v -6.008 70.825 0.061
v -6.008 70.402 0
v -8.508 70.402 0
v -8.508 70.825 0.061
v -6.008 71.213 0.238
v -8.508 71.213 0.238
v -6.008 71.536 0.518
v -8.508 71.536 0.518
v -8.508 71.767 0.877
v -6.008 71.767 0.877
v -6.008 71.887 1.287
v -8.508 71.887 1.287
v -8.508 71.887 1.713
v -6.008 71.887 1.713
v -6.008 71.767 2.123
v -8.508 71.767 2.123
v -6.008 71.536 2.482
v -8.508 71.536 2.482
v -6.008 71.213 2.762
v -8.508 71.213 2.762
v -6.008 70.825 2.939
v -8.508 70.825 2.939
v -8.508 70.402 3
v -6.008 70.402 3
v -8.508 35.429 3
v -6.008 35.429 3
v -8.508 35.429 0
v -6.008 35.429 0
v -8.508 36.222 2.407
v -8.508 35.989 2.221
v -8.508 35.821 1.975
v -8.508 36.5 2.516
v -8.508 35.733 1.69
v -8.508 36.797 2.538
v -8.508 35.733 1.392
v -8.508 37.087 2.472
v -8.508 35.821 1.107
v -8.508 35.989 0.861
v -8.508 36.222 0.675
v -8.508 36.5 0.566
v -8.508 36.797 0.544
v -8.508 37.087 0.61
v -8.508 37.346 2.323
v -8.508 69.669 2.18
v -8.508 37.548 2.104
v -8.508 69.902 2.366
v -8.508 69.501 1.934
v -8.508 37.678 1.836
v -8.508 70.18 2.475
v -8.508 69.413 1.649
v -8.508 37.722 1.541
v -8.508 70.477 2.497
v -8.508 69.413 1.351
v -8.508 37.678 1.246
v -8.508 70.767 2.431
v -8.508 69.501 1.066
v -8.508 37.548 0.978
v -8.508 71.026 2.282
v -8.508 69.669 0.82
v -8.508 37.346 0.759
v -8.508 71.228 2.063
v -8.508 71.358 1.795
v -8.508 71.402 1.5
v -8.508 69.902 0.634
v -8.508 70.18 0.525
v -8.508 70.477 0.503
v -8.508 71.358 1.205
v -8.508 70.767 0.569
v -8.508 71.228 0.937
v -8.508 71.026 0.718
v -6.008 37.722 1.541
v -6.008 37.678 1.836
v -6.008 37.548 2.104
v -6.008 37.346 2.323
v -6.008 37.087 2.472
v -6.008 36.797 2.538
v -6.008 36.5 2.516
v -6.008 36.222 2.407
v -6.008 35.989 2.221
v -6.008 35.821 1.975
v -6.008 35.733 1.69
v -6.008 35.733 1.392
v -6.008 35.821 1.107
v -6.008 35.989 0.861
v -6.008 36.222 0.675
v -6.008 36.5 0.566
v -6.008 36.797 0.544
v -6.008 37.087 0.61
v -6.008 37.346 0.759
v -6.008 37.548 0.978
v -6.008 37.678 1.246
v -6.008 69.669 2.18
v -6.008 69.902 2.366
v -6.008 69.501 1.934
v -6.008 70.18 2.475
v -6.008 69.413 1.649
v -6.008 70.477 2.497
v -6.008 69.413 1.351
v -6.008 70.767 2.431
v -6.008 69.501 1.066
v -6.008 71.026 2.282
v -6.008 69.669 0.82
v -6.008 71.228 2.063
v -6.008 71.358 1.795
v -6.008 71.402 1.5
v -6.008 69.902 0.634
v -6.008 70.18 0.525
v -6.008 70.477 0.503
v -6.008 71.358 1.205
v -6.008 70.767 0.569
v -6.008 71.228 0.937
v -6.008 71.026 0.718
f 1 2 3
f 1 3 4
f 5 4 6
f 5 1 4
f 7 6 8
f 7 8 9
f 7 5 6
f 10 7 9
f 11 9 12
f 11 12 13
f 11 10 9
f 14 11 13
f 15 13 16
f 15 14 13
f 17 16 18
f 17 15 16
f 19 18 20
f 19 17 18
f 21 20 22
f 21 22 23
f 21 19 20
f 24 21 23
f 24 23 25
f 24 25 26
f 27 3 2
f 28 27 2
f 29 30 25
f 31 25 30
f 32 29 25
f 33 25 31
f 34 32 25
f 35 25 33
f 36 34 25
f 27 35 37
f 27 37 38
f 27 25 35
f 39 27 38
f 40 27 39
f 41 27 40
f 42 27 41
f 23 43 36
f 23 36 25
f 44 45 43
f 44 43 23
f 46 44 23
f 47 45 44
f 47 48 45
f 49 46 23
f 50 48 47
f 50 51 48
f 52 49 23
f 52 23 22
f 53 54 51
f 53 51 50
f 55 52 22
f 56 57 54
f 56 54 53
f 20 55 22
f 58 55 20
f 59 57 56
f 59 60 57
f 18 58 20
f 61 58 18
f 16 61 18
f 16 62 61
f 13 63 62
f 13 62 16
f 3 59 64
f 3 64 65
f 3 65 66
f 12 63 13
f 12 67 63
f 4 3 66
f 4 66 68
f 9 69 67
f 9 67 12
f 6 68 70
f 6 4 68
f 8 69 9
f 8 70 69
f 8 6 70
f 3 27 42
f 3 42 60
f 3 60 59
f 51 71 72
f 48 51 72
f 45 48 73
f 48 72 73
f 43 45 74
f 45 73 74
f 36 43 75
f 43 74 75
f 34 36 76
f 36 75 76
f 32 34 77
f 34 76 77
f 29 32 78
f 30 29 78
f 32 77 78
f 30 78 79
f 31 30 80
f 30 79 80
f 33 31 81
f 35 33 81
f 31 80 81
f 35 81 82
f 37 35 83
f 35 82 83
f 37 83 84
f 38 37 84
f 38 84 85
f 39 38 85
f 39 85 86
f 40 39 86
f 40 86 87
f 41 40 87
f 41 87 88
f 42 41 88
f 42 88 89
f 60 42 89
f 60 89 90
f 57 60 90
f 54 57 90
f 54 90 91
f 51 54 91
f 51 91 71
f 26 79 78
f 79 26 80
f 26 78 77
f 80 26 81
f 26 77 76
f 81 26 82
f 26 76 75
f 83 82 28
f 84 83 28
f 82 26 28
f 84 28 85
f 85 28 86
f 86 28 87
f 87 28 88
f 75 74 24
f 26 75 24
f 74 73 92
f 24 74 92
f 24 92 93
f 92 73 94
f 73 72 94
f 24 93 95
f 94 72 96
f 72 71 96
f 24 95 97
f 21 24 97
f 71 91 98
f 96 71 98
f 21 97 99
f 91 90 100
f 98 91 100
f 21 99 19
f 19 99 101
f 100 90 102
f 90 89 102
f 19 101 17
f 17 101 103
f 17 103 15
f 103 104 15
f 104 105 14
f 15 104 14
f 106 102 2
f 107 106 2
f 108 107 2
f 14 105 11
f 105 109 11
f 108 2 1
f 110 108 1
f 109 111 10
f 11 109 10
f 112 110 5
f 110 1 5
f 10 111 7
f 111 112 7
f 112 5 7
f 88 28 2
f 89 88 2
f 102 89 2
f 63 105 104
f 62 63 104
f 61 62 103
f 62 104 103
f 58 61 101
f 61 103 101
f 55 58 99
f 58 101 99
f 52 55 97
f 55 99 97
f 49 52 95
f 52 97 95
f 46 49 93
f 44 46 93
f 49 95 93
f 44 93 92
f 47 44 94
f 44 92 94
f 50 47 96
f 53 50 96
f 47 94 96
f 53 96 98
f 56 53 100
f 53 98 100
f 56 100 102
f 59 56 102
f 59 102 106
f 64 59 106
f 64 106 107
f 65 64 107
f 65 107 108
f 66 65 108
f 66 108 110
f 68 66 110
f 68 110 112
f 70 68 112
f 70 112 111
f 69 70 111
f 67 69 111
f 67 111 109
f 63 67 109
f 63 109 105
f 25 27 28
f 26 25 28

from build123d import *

# Parameters (mm, degrees)
CROQUIS1_W              = 2.5
CROQUIS1_H              = 37
SALIENTE_EXTRUIR1_DEPTH = 3
CORTAR_EXTRUIR7_REACH   = 74.534
CROQUIS10_R             = 1
CROQUIS12_R             = 1
CORTAR_EXTRUIR9_DEPTH   = 10


with BuildPart() as part:
    # Croquis1 → Saliente-Extruir1 (new body)
    with BuildSketch(Plane.XY):
        with Locations((-7.257787801, 53.928529755)):
            Rectangle(CROQUIS1_W, CROQUIS1_H)
    extrude(amount=SALIENTE_EXTRUIR1_DEPTH)

    # Croquis10 → Cortar-Extruir7 (cut, up to next)
    with BuildSketch(Plane(origin=(-6.007787801, 0, 0), x_dir=(0, 0, -1), z_dir=(1, 0, 0)), mode=Mode.PRIVATE) as cortar_extruir7_sk1:
        with Locations(Location((-1.5, 70.40205312, 0), (0, 0, 90))):
            Circle(CROQUIS10_R)
    cortar_extruir7_tool1 = extrude(cortar_extruir7_sk1.sketch, amount=-CORTAR_EXTRUIR7_REACH, mode=Mode.PRIVATE) & part.part
    # Croquis10 → Cortar-Extruir7 (cut, up to next)
    with BuildSketch(Plane(origin=(-6.007787801, 0, 0), x_dir=(0, 0, -1), z_dir=(1, 0, 0)), mode=Mode.PRIVATE) as cortar_extruir7_sk2:
        with BuildLine():
            Line((-3, 70.40205312), (-3, 72.428529755))
            Line((-3, 72.428529755), (0, 72.428529755))
            Line((0, 72.428529755), (0, 70.40205312))
            ThreePointArc((0, 70.40205312), (-1.5, 71.90205312), (-3, 70.40205312))
        make_face()
    cortar_extruir7_tool2 = extrude(cortar_extruir7_sk2.sketch, amount=-CORTAR_EXTRUIR7_REACH, mode=Mode.PRIVATE) & part.part
    add(cortar_extruir7_tool1.solids().sort_by_distance((-6.007788, 70.402053, 1.5))[0], mode=Mode.SUBTRACT)
    add(cortar_extruir7_tool2.solids().sort_by_distance((-6.007788, 71.938281, 1.5))[0], mode=Mode.SUBTRACT)

    # Croquis12 → Cortar-Extruir9 (cut)
    with BuildSketch(Plane(origin=(-6.007787801, 0, 0), x_dir=(0, 0, -1), z_dir=(1, 0, 0))):
        with Locations(Location((-1.541120901, 36.722060173, 0), (0, 0, 90))):
            Circle(CROQUIS12_R)
    extrude(amount=-CORTAR_EXTRUIR9_DEPTH, mode=Mode.SUBTRACT)


solid = part.part
